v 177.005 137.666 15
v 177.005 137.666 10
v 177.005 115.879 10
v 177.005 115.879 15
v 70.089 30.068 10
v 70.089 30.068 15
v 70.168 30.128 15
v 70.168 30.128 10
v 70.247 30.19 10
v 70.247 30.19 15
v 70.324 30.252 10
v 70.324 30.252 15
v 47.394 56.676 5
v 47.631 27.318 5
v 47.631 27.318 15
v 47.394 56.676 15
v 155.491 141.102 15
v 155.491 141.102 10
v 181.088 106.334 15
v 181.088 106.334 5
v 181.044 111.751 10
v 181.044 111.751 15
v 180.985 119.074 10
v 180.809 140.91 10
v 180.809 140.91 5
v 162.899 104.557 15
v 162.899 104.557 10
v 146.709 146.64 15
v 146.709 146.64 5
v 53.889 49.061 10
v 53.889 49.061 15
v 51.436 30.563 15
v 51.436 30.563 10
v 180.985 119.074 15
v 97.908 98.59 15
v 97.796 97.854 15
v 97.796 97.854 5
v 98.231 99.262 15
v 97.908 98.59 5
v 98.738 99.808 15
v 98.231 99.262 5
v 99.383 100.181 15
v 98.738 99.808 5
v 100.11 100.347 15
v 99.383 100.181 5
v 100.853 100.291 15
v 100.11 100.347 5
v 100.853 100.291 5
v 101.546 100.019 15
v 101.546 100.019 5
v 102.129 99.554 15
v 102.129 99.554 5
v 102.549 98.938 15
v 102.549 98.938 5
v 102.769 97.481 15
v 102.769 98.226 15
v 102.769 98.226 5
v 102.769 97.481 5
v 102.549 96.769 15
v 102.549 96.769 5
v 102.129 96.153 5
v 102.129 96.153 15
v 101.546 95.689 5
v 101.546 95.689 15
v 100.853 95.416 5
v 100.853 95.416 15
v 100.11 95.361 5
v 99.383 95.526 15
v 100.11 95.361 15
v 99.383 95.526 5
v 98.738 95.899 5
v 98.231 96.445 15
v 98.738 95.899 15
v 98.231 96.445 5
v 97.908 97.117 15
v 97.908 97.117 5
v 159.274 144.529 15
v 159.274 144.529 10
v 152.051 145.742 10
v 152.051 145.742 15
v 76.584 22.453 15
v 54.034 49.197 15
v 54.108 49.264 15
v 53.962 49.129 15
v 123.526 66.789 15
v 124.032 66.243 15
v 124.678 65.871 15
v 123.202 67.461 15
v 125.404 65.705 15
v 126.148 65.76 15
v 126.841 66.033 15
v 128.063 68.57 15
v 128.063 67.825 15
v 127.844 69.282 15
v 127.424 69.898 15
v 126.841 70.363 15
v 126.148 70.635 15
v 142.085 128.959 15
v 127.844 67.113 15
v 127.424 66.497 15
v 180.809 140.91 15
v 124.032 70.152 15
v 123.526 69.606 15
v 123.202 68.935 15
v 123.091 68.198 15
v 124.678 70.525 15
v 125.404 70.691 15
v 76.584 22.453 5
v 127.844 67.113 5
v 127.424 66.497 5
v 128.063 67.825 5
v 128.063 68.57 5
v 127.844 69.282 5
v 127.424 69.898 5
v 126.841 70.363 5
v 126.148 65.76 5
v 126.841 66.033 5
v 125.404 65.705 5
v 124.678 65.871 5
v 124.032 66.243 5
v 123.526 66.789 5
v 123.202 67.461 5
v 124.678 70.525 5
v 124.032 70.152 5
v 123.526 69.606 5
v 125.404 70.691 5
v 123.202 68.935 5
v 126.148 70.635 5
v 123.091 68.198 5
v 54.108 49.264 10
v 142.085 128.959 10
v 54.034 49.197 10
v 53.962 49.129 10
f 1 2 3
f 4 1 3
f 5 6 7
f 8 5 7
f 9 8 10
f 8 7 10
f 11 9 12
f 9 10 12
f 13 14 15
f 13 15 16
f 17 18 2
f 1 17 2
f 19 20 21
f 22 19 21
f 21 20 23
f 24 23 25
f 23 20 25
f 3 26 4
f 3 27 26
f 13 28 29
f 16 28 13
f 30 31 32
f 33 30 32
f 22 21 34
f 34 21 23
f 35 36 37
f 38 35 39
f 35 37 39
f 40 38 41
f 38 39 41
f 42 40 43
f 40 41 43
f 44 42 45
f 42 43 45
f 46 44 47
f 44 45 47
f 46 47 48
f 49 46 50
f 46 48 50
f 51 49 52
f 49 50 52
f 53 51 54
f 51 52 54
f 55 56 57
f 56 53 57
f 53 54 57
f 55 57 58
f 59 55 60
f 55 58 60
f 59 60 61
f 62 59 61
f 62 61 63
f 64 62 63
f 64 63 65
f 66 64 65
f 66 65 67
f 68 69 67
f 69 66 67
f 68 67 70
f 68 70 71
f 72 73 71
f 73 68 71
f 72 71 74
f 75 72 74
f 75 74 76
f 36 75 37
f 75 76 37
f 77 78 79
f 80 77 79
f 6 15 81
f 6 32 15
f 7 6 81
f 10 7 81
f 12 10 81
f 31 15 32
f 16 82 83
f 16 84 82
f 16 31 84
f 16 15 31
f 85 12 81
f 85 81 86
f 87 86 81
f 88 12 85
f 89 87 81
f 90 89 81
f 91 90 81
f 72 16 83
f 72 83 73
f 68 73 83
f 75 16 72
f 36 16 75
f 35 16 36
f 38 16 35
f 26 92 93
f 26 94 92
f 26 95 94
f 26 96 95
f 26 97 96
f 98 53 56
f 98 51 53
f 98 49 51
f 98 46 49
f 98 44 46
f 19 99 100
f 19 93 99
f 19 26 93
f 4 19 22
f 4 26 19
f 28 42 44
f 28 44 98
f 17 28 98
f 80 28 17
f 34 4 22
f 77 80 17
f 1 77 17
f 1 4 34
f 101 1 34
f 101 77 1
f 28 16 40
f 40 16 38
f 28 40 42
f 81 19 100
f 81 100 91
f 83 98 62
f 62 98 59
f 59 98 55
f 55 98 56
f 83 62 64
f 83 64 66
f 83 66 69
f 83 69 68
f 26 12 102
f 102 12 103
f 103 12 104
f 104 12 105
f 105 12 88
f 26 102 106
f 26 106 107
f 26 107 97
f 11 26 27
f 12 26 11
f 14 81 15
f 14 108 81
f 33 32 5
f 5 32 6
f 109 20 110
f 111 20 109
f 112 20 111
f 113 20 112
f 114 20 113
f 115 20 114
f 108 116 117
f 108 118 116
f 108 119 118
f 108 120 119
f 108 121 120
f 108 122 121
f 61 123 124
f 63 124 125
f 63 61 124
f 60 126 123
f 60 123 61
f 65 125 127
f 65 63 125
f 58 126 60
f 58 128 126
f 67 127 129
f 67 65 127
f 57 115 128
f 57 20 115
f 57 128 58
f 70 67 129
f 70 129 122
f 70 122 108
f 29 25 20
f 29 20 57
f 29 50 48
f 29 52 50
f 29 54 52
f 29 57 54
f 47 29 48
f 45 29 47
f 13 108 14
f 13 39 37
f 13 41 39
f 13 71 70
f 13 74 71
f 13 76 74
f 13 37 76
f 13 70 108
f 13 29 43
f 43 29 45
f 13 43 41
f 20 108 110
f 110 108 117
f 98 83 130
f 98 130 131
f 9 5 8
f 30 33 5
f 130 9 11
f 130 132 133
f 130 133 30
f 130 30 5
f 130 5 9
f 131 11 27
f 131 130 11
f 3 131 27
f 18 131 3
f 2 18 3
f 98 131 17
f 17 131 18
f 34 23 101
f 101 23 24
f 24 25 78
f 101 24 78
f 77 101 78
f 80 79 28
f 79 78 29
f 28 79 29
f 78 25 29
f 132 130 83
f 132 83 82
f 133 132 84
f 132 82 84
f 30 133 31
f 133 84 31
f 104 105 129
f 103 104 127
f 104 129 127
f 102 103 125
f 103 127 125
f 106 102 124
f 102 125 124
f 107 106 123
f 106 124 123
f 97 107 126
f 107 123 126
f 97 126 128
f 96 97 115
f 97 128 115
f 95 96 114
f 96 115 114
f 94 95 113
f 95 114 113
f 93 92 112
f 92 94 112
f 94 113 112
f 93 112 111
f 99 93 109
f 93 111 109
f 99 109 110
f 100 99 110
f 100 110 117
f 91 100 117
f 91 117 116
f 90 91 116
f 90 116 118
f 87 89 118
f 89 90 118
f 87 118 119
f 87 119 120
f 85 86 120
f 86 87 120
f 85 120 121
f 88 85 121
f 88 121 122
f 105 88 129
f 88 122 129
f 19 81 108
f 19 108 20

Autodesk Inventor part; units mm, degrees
ref_plane "XZ Plane" through (0, 0, 0) normal (0, 1, 0) x (-1, 0, 0)
ref_plane "XY Plane" through (0, 0, 0) normal (0, 0, 1) x (1, 0, 0)
sketch "Sketch1" plane through (0, 0, 0) normal (0, 0, 1) x (1, 0, 0)
  line L0 (0, 0) -> (100, 0)
  line L1 (100, 0) -> (100, 25)
  line L2 (100, 25) -> (0, 25)
  line L3 (0, 25) -> (0, 0)
  line L4 (0, 25) -> (115.2078, 140.2078)
  line L5 (100, 0) -> (177.7078, 77.7078)
  line L6 (151.2922, 176.2922) -> (200.5844, 163.0844)
  line L7 (200.5844, 163.0844) -> (213.7922, 113.7922)
  line L8 (213.7922, 113.7922) -> (177.7078, 77.7078)
  line L9 (177.7078, 77.7078) -> (128.4156, 90.9156)
  line L10 (128.4156, 90.9156) -> (115.2078, 140.2078)
  line L11 (115.2078, 140.2078) -> (151.2922, 176.2922)
  circle A0 centre (164.5, 127) radius 4
  dimension "d0" = 100
  dimension "d1" = 25
  dimension "d6" = 8
  dimension "d8" = 45
  dimension "d15" = 127
extrude "Extrusion1" add sketch "Sketch1" along normal blind 20
sketch "Sketch2" plane through (0, 0, 20) normal (0, 0, 1) x (1, 0, 0)
  line L0 (0, 25) -> (0, 0) projected
  line L1 (0, 0) -> (100, 0) projected
  line L2 (0, 25) -> (100, 25)
  line L3 (100, 25) -> (100, 0)
  line L4 (100, 0) -> (0, 0)
  line L5 (0, 0) -> (0, 25)
  line L6 (100, 25) -> (125, 25)
  line L7 (100, 0) -> (213.7922, 113.7922) projected
  line L8 (100, 0) -> (125, 25)
extrude "Extrusion2" add sketch "Sketch2" along normal blind 250
sketch "Sketch4" plane through (0, 0, 270) normal (0, 0, 1) x (1, 0, 0)
  line L0 (0, 25) -> (125, 25) projected
  line L1 (125, 25) -> (213.7922, 113.7922) projected
  line L2 (213.7922, 113.7922) -> (200.5844, 163.0844) projected
  line L3 (200.5844, 163.0844) -> (151.2922, 176.2922) projected
  line L4 (151.2922, 176.2922) -> (0, 25) projected
  circle A0 centre (164.5, 127) radius 4 projected
  line L5 (100, 0) -> (125, 25) projected
  line L6 (125, 25) -> (0, 25) projected
  line L7 (0, 25) -> (0, 0) projected
  line L8 (0, 0) -> (100, 0) projected
extrude "Extrusion3" add sketch "Sketch4" along normal blind 20
sketch "Sketch5" plane through (0, 0, 0) normal (0, -1, 0) x (1, 0, 0)
  line L0 (0, 0) -> (100, 0) projected
  line L1 (100, 0) -> (100, 290) projected
  line L2 (0, 290) -> (100, 290) projected
  line L3 (0, 0) -> (0, 290) projected
  line L4 (0, 0) -> (-125.5737, 72.5)
  line L5 (-125.5737, 72.5) -> (-125.5737, 217.5)
  line L6 (-125.5737, 217.5) -> (0, 290)
  line L7 (0, 290) -> (125.5737, 217.5)
  line L8 (125.5737, 217.5) -> (125.5737, 72.5)
  line L9 (125.5737, 72.5) -> (0, 0)
  point P0 (0, 145)
extrude "Extrusion4" add sketch "Sketch5" against normal blind 25 contours L4 L5 L6 L3
sketch "Sketch6" plane through (0, 25, 20) normal (0, 1, 0) x (1, 0, 0)
  line L0 (100, 20) -> (100, -270) projected
  circle A0 centre (-24.528, -125) radius 3
  circle A1 centre (-31.528, -125) radius 1.5
  circle A2 centre (-21.028, -131.0622) radius 1.5
  circle A3 centre (-21.028, -118.9378) radius 1.5
  point P0 (0, 20)
  point P1 (100, -125)
  dimension "d18" = 6
  dimension "d19" = 124.528
  dimension "d20" = 3
  dimension "d21" = 7
  dimension "d24" = 360
extrude "Extrusion5" cut sketch "Sketch6" against normal through all
sketch "Sketch7" plane through (100, 0, 0) normal (0, -1, 0) x (1, 0, 0)
  circle A0 centre (-124.528, 145) radius 3 projected
  circle A1 centre (-124.528, 145) radius 12
  point P0 (-100, 0)
  dimension "d28" = 24
extrude "Extrusion6" cut sketch "Sketch7" against normal blind 5
sketch "Sketch8" plane through (0, 0, 270) normal (0, 0, -1) x (-1, 0, 0)
  circle A0 centre (-164.5, 127) radius 4 projected
  circle A1 centre (-164.5, 127) radius 12.5
  point P0 (0, 0)
  dimension "d31" = 25
extrude "Extrusion7" cut sketch "Sketch8" against normal blind 7
sketch "Sketch10" plane through (164.5, 127, 277) normal (0, 0, -1) x (-1, 0, 0)
  circle A0 centre (7, 0) radius 2
  circle A1 centre (0, 0) radius 4 projected
  circle A2 centre (-3.5, 6.0622) radius 2
  circle A3 centre (-3.5, -6.0622) radius 2
  point P0 (164.5, -127)
  dimension "d34" = 4
  dimension "d37" = 360
  dimension "d39" = 7
extrude "Extrusion8" cut sketch "Sketch10" against normal through all
sketch "Sketch11" plane through (0, 0, 290) normal (0, 0, 1) x (1, 0, 0)
  circle A0 centre (168, 133.0622) radius 2 projected
  circle A1 centre (164.5, 127) radius 4 projected
  circle A2 centre (168, 133.0622) radius 4
  circle A3 centre (157.5, 127) radius 4
  circle A4 centre (168, 120.9378) radius 4
  point P0 (0, 0)
  dimension "d42" = 8
  dimension "d45" = 360
extrude "Extrusion9" cut sketch "Sketch11" against normal blind 3 contours A0 | A1 A4 A3 A2 | A2 A1 | A1 A2 | A4 A1 | A1 A4 | A3 A1 | A1 A3
ref_plane "Work Plane1" through (164.5, 127, 270) normal (1, 0, 0) x (0, 0, 1)
sketch "Sketch12" plane through (164.5, 127, 270) normal (1, 0, 0) x (0, 0, 1)
  line L0 (17, -1.9365) -> (17, 1.9365) projected
  line L1 (17, 1.9365) -> (20, 1.9365) projected
  line L2 (20, 3.9993) -> (20, 1.9365) projected
  line L3 (20, 3.9993) -> (17, 3.9993) projected
  line L4 (17, 3.9993) -> (17, 2.0628) projected
  line L5 (17, 2.0628) -> (20, 2.0628) projected
  line L6 (20, -2.0628) -> (20, 2.0628) projected
  line L7 (20, -2.0628) -> (17, -2.0628) projected
  line L8 (17, -2.0628) -> (17, -3.9993) projected
  line L9 (17, -3.9993) -> (20, -3.9993) projected
  line L10 (20, -1.9365) -> (20, -3.9993) projected
  line L11 (20, -1.9365) -> (17, -1.9365) projected
  line L12 (7, 4) -> (7, -4) projected
  line L13 (7, -12.5) -> (7, 12.5) projected
  line L14 (0, -12.5) -> (0, 12.5) projected
  circle A0 centre (3.5, 0) radius 2
  line L15 (0, -12.5) -> (7, -12.5) projected
  point P0 (-270, 127)
  point P1 (7, 0)
  point P2 (3.5, -12.5)
  dimension "d50" = 4
extrude "Extrusion10" cut sketch "Sketch12" along normal through all contours A0
sketch "Sketch13" plane through (0, 0, 20) normal (0, 0, 1) x (1, 0, 0)
  line L0 (100, 0) -> (213.7922, 113.7922) projected
  line L1 (213.7922, 113.7922) -> (200.5844, 163.0844) projected
  line L2 (200.5844, 163.0844) -> (151.2922, 176.2922) projected
  line L3 (151.2922, 176.2922) -> (0, 25) projected
  line L4 (0, 25) -> (0, 0) projected
  line L5 (0, 0) -> (100, 0) projected
  arc A0 (161, 128.9365) -> (161, 125.0635) centre (157.5, 127) ccw projected
  arc A1 (164.5729, 130.9993) -> (161, 128.9365) centre (164.5, 127) ccw projected
  arc A2 (167.9271, 129.0628) -> (164.5729, 130.9993) centre (168, 133.0622) ccw projected
  arc A3 (167.9271, 124.9372) -> (167.9271, 129.0628) centre (164.5, 127) ccw projected
  arc A4 (164.5729, 123.0007) -> (167.9271, 124.9372) centre (168, 120.9378) ccw projected
  arc A5 (161, 125.0635) -> (164.5729, 123.0007) centre (164.5, 127) ccw projected
  line L6 (-125.5737, 25) -> (0, 25) projected
  line L7 (0, 0) -> (-125.5737, 0) projected
  line L8 (0, 25) -> (0, 0) projected
  line L9 (-125.5737, 25) -> (0, 25) projected
  line L10 (-125.5737, 0) -> (-125.5737, 25) projected
extrude "Extrusion11" cut sketch "Sketch13" along normal through all contours L5 L4 L3 L2 L1 L0 | L7 L10 L6 L4 | A1 A2 A3 A4 A5 A0
sketch "Sketch14" plane through (0, 0, 20) normal (0, 0, 1) x (1, 0, 0)
  line L0 (-34.641, 0) -> (0, 0) projected
  line L1 (151.2922, 176.2922) -> (0, 25) projected
  line L2 (0, 0) -> (0, 25)
  line L3 (-34.641, 0) -> (-34.641, 25) projected
  line L4 (0, 25) -> (-34.641, 25)
  line L5 (-34.641, 25) -> (-34.641, 0)
  line L6 (-34.641, 0) -> (0, 0)
extrude "Extrusion12" cut sketch "Sketch14" against normal through all
sketch "Sketch15" plane through (0, 0, 20) normal (0, 0, 1) x (1, 0, 0)
  line L0 (15, 12.5) -> (90, 12.5) construction
  line L1 (0, 0) -> (100, 0) projected
  circle A0 centre (15, 12.5) radius 2.5
  circle A1 centre (90, 12.5) radius 2.5
  dimension "d57" = 75
  dimension "d58" = 12.5
  dimension "d59" = 10
  dimension "d60" = 5
  dimension "d61" = 5
extrude "Extrusion13" cut sketch "Sketch15" against normal through all
sketch "Sketch16" plane through (0, 0, 20) normal (0, 0, 1) x (1, 0, 0)
  circle A0 centre (164.5, 127) radius 4 projected
  circle A1 centre (164.5, 127) radius 11.5
  point P0 (0, 0)
  dimension "d64" = 23
extrude "Extrusion14" cut sketch "Sketch16" against normal through all
sketch "Sketch17" plane through (0, 0, 20) normal (0, 0, 1) x (1, 0, 0)
  circle A0 centre (164.5, 127) radius 11.5 projected
  circle A1 centre (164.5, 127) radius 22.5
  point P0 (0, 0)
  dimension "d67" = 45
extrude "Extrusion15" cut sketch "Sketch17" against normal blind 10
sketch "Sketch18" plane through (0, 0, 20) normal (0, 0, 1) x (1, 0, 0)
  circle A0 centre (62.5, 40) radius 7.5
  line L0 (0, 25) -> (0, 0) projected
  line L1 (0, 25) -> (125, 25)
  line L2 (100, 0) -> (213.7922, 113.7922) projected
  point P0 (62.5, 25)
  dimension "d70" = 15
  dimension "d71" = 15
extrude "Extrusion16" cut sketch "Sketch18" against normal through all
sketch "Sketch19" plane through (0, 0, 0) normal (0, 0, -1) x (-1, 0, 0)
  line L0 (-156.7794, 135.523) -> (-57.4648, 45.5585)
  circle A0 centre (-62.5, 40) radius 7.5 projected
  line L1 (-67.1947, 34.1511) -> (-171.6985, 118.0316)
  circle A1 centre (-164.5, 127) radius 11.5 projected
  circle A2 centre (-62.5, 40) radius 7.5 projected
  arc A3 (-156.7794, 135.523) -> (-171.6985, 118.0316) centre (-164.5, 127) ccw
  arc A4 (-67.1947, 34.1511) -> (-57.4648, 45.5585) centre (-62.5, 40) ccw
  point P0 (0, 0)
extrude "Extrusion17" cut sketch "Sketch19" against normal blind 4
sketch "Sketch20" plane through (0, 0, 0) normal (0, 0, -1) x (-1, 0, 0)
  arc A0 (-156.7794, 135.523) -> (-171.6985, 118.0316) centre (-164.5, 127) ccw projected
  line L0 (-156.7794, 135.523) -> (-57.4648, 45.5585) projected
  line L1 (-67.1947, 34.1511) -> (-171.6985, 118.0316) projected
  arc A1 (-67.1947, 34.1511) -> (-57.4648, 45.5585) centre (-62.5, 40) ccw projected
  line L2 (-47.3944, 56.6755) -> (-146.709, 146.64)
  arc A2 (-146.709, 146.64) -> (-181.0879, 106.3338) centre (-164.5, 127) ccw
  line L3 (-181.0879, 106.3338) -> (-76.584, 22.4532)
  arc A3 (-76.584, 22.4532) -> (-47.3944, 56.6755) centre (-62.5, 40) ccw
  point P0 (0, 0)
  dimension "d76" = 15
extrude "Extrusion18" cut sketch "Sketch20" against normal blind 5 contours L0 A1 L1 A0 | A3 L3 A2 L2
sketch "Sketch21" plane through (0, 0, 5) normal (0, 0, -1) x (-1, 0, 0)
  circle A0 centre (-62.5, 40) radius 7.5 projected
  circle A1 centre (-164.5, 127) radius 11.5 projected
  line L0 (-146.709, 146.64) -> (-47.3944, 56.6755) projected
  arc A2 (-146.709, 146.64) -> (-181.0879, 106.3338) centre (-164.5, 127) ccw projected
  line L1 (-76.584, 22.4532) -> (-181.0879, 106.3338) projected
  arc A3 (-76.584, 22.4532) -> (-47.3944, 56.6755) centre (-62.5, 40) ccw projected
  line L2 (-76.584, 22.4532) -> (-181.0879, 106.3338) projected
  line L3 (-128.8359, 64.3935) -> (-97.0517, 101.6578) construction
  line L4 (-146.709, 146.64) -> (-47.3944, 56.6755) projected
  circle A4 centre (-125.5912, 68.1977) radius 2.5
  circle A5 centre (-100.2965, 97.8536) radius 2.5
  point P0 (0, 0)
  dimension "d79" = 5
  dimension "d80" = 5
  dimension "d81" = 5
  dimension "d82" = 5
extrude "Extrusion19" cut sketch "Sketch21" against normal through all contours A4 | A5
sketch "Sketch22" plane through (0, 0, 5) normal (0, 0, -1) x (-1, 0, 0)
  circle A0 centre (-125.5912, 68.1977) radius 2.5 projected
  circle A1 centre (-100.2965, 97.8536) radius 2.5 projected
  circle A2 centre (-62.5, 40) radius 7.5 projected
  circle A3 centre (-164.5, 127) radius 11.5 projected
  line L0 (-146.709, 146.64) -> (-47.3944, 56.6755) projected
  arc A4 (-146.709, 146.64) -> (-181.0879, 106.3338) centre (-164.5, 127) ccw projected
  line L1 (-76.584, 22.4532) -> (-181.0879, 106.3338) projected
  arc A5 (-76.584, 22.4532) -> (-47.3944, 56.6755) centre (-62.5, 40) ccw projected
  arc A6 (-146.709, 146.64) -> (-181.0879, 106.3338) centre (-164.5, 127) ccw projected
  line L2 (-146.709, 146.64) -> (-47.3944, 56.6755) projected
  arc A7 (-76.584, 22.4532) -> (-47.3944, 56.6755) centre (-62.5, 40) ccw projected
  line L3 (-76.584, 22.4532) -> (-181.0879, 106.3338) projected
  line L4 (0, 0) -> (-100, 0) projected
  line L5 (0, 25) -> (0, 0) projected
  line L6 (-151.2922, 176.2922) -> (0, 25) projected
  line L7 (-200.5844, 163.0844) -> (-151.2922, 176.2922) projected
  line L8 (-213.7922, 113.7922) -> (-200.5844, 163.0844) projected
  line L9 (-100, 0) -> (-213.7922, 113.7922) projected
  circle A8 centre (-90, 12.5) radius 2.5 projected
  circle A9 centre (-15, 12.5) radius 2.5 projected
extrude "Extrusion20" cut sketch "Sketch22" along normal through all both and the other way through all contours L4 L9 L8 L7 L6 L5
sketch "Sketch23" plane through (0, 0, 20) normal (0, 0, 1) x (1, 0, 0)
  line L0 (76.584, 22.4532) -> (181.0879, 106.3338) projected
  arc A0 (47.3944, 56.6755) -> (76.584, 22.4532) centre (62.5, 40) ccw projected
  line L1 (76.584, 22.4532) -> (181.0879, 106.3338) projected
  arc A1 (181.0879, 106.3338) -> (146.709, 146.64) centre (164.5, 127) ccw projected
  line L2 (146.709, 146.64) -> (47.3944, 56.6755) projected
  circle A2 centre (125.5912, 68.1977) radius 2.5 projected
  circle A3 centre (100.2965, 97.8536) radius 2.5 projected
  circle A4 centre (62.5, 40) radius 7.5 projected
  circle A5 centre (164.5, 127) radius 22.5 projected
  arc A6 (174.8283, 114.1323) -> (153.4226, 139.2287) centre (164.5, 127) ccw
  line L3 (174.8283, 114.1323) -> (70.3245, 30.2518)
  arc A7 (54.108, 49.2642) -> (70.3245, 30.2518) centre (62.5, 40) ccw
  line L4 (54.108, 49.2642) -> (153.4226, 139.2287)
  point P0 (0, 0)
  dimension "d87" = 10
extrude "Extrusion21" cut sketch "Sketch23" against normal blind 10 contours L4 A6 L3 A5 | A5 L3 A7 L4 picked at (159.1311, 121.3058)
sketch "Sketch24" plane through (0, 0, 10) normal (0, 0, 1) x (1, 0, 0)
  circle A0 centre (62.5, 40) radius 7.5 projected
  circle A1 centre (164.5, 127) radius 11.5 projected
  point P0 (0, 0)
extrude "Extrusion22" add sketch "Sketch24" against normal blind 5
sketch "Sketch25" plane through (0, 0, 20) normal (0, 0, 1) x (1, 0, 0)
  line L0 (54.108, 49.2642) -> (142.0854, 128.9589) projected
  arc A0 (162.8988, 104.557) -> (142.0854, 128.9589) centre (164.5, 127) ccw projected
  line L1 (162.8988, 104.557) -> (70.3245, 30.2518) projected
  arc A1 (54.108, 49.2642) -> (70.3245, 30.2518) centre (62.5, 40) ccw projected
  arc A2 (47.3944, 56.6755) -> (76.584, 22.4532) centre (62.5, 40) ccw projected
  line L2 (76.584, 22.4532) -> (181.0879, 106.3338) projected
  arc A3 (181.0879, 106.3338) -> (146.709, 146.64) centre (164.5, 127) ccw projected
  line L3 (146.709, 146.64) -> (47.3944, 56.6755) projected
  circle A4 centre (125.5912, 68.1977) radius 2.5 projected
  circle A5 centre (100.2965, 97.8536) radius 2.5 projected
  point P0 (0, 0)
extrude "Extrusion23" cut sketch "Sketch25" against normal blind 5
sketch "Sketch26" plane through (0, 0, 5) normal (0, 0, -1) x (-1, 0, 0)
  arc A0 (-146.709, 146.64) -> (-181.0879, 106.3338) centre (-164.5, 127) ccw projected
  line L0 (-164.5, 127) -> (-180.8089, 140.9105)
  arc A1 (-76.584, 22.4532) -> (-47.3944, 56.6755) centre (-62.5, 40) ccw projected
  line L1 (-164.5, 127) -> (-62.5, 40)
  line L2 (-181.0879, 106.3338) -> (-180.8089, 140.9105)
  line L3 (-180.8089, 140.9105) -> (-146.709, 146.64)
  point P0 (0, 0)
  dimension "d95" = 100
extrude "Extrusion24" cut sketch "Sketch26" against normal through all
sketch "Sketch27" plane through (0, 0, 5) normal (0, 0, -1) x (-1, 0, 0)
  arc A0 (-76.584, 22.4532) -> (-47.3944, 56.6755) centre (-62.5, 40) ccw projected
  line L0 (-76.584, 22.4532) -> (-76.584, 22.4532)
  line L1 (-181.0879, 106.3338) -> (-76.584, 22.4532) projected
  arc A1 (-76.584, 22.4532) -> (-47.3944, 56.6755) centre (-62.5, 40) ccw projected
  line L2 (-76.584, 22.4532) -> (-47.3944, 56.6755)
  point P0 (0, 0)
extrude "Extrusion25" cut sketch "Sketch27" against normal through all
sketch "Sketch28" plane through (0, 0, 5) normal (0, 0, -1) x (-1, 0, 0)
  line L0 (-76.584, 22.4532) -> (-47.3944, 56.6755) projected
  line L1 (-76.584, 22.4532) -> (-47.6313, 27.3179)
  line L2 (-47.6313, 27.3179) -> (-47.3944, 56.6755)
  line L3 (-180.8089, 140.9105) -> (-47.6313, 27.3179)
  point P0 (0, 0)
  point P1 (-61.9892, 39.5643)
  dimension "d101" = 100
extrude "Extrusion26" add sketch "Sketch28" against normal blind 10
sketch "Sketch30" plane through (0, 0, 15) normal (0, 0, 1) x (1, 0, 0)
  line L0 (70.0894, 30.0676) -> (53.8891, 49.061) projected
  line L1 (53.8891, 49.061) -> (51.4355, 30.5626)
  line L2 (51.4355, 30.5626) -> (70.0894, 30.0676)
  line L3 (76.584, 22.4532) -> (47.6313, 27.3179) projected
  line L4 (47.6313, 27.3179) -> (61.9892, 39.5643)
  point P0 (0, 0)
  dimension "d105" = 5
extrude "Extrusion27" cut sketch "Sketch30" against normal blind 5
sketch "Sketch31" plane through (0, 0, 10) normal (0, 0, 1) x (1, 0, 0)
  line L0 (180.8089, 140.9105) -> (152.0512, 145.7424) projected
  line L1 (181.0442, 111.7507) -> (180.8089, 140.9105) projected
  line L2 (162.8988, 104.557) -> (180.9851, 119.0741)
  line L3 (70.3245, 30.2518) -> (162.8988, 104.557) projected
  line L4 (162.8988, 104.557) -> (162.8988, 91.7342)
  line L5 (76.584, 22.4532) -> (181.0879, 106.3338) projected
  line L6 (181.0879, 106.3338) -> (181.0442, 111.7507) projected
  line L7 (181.0879, 106.3338) -> (162.8988, 91.7342)
  line L8 (181.0879, 106.3338) -> (180.9851, 119.0741)
  line L9 (180.8089, 140.9105) -> (181.0879, 106.3338) projected
  line L10 (47.3944, 56.6755) -> (47.6313, 27.3179) projected
  line L11 (47.6313, 27.3179) -> (180.8089, 140.9105)
  line L12 (152.0512, 145.7424) -> (180.8089, 140.9105)
  line L13 (142.0854, 128.9589) -> (159.2736, 144.5289)
  line L14 (54.108, 49.2642) -> (142.0854, 128.9589)
  line L15 (142.0854, 128.9589) -> (129.4231, 130.9815)
  line L16 (47.3944, 56.6755) -> (146.709, 146.64)
  line L17 (146.709, 146.64) -> (152.0512, 145.7424)
  line L18 (146.709, 146.64) -> (129.4231, 130.9815)
  line L19 (146.709, 146.64) -> (159.2736, 144.5289)
  line L20 (180.8089, 140.9105) -> (146.709, 146.64)
  point P0 (0, 0)
extrude "Extrusion28" add sketch "Sketch31" along normal blind 5 contours L13 L15 L16 L17 L0 | L6 L5 L4 L2 L1
sketch "Sketch32" plane through (0, 0, 10) normal (0, 0, 1) x (1, 0, 0)
  line L0 (142.8286, 143.125) -> (177.0047, 137.6658)
  line L1 (177.0047, 137.6658) -> (177.0047, 103.0564)
  line L2 (76.584, 22.4532) -> (181.0879, 106.3338) projected
  line L3 (142.8286, 143.125) -> (177.0047, 103.0564)
  line L4 (47.3944, 56.6755) -> (47.6313, 27.3179) projected
  line L5 (180.9851, 119.0741) -> (180.8089, 140.9105) projected
  line L6 (47.6313, 27.3179) -> (180.8089, 140.9105)
  line L7 (146.709, 146.64) -> (47.3944, 56.6755) projected
  line L8 (142.8286, 143.125) -> (146.709, 146.64)
  line L9 (146.709, 146.64) -> (180.8089, 140.9105) projected
  line L10 (146.709, 146.64) -> (180.8089, 140.9105)
  line L11 (180.8089, 140.9105) -> (181.0879, 106.3338)
  line L12 (181.0879, 106.3338) -> (177.0047, 103.0564)
  point P0 (0, 0)
  point P1 (159.9167, 123.0907)
  dimension "d110" = 5
extrude "Extrusion29" add sketch "Sketch32" along normal blind 5 contours L7 L9 L6 L0 | L6 L5 L11 L2 L1
properties part number "HA02" material "ABS Plastic"
